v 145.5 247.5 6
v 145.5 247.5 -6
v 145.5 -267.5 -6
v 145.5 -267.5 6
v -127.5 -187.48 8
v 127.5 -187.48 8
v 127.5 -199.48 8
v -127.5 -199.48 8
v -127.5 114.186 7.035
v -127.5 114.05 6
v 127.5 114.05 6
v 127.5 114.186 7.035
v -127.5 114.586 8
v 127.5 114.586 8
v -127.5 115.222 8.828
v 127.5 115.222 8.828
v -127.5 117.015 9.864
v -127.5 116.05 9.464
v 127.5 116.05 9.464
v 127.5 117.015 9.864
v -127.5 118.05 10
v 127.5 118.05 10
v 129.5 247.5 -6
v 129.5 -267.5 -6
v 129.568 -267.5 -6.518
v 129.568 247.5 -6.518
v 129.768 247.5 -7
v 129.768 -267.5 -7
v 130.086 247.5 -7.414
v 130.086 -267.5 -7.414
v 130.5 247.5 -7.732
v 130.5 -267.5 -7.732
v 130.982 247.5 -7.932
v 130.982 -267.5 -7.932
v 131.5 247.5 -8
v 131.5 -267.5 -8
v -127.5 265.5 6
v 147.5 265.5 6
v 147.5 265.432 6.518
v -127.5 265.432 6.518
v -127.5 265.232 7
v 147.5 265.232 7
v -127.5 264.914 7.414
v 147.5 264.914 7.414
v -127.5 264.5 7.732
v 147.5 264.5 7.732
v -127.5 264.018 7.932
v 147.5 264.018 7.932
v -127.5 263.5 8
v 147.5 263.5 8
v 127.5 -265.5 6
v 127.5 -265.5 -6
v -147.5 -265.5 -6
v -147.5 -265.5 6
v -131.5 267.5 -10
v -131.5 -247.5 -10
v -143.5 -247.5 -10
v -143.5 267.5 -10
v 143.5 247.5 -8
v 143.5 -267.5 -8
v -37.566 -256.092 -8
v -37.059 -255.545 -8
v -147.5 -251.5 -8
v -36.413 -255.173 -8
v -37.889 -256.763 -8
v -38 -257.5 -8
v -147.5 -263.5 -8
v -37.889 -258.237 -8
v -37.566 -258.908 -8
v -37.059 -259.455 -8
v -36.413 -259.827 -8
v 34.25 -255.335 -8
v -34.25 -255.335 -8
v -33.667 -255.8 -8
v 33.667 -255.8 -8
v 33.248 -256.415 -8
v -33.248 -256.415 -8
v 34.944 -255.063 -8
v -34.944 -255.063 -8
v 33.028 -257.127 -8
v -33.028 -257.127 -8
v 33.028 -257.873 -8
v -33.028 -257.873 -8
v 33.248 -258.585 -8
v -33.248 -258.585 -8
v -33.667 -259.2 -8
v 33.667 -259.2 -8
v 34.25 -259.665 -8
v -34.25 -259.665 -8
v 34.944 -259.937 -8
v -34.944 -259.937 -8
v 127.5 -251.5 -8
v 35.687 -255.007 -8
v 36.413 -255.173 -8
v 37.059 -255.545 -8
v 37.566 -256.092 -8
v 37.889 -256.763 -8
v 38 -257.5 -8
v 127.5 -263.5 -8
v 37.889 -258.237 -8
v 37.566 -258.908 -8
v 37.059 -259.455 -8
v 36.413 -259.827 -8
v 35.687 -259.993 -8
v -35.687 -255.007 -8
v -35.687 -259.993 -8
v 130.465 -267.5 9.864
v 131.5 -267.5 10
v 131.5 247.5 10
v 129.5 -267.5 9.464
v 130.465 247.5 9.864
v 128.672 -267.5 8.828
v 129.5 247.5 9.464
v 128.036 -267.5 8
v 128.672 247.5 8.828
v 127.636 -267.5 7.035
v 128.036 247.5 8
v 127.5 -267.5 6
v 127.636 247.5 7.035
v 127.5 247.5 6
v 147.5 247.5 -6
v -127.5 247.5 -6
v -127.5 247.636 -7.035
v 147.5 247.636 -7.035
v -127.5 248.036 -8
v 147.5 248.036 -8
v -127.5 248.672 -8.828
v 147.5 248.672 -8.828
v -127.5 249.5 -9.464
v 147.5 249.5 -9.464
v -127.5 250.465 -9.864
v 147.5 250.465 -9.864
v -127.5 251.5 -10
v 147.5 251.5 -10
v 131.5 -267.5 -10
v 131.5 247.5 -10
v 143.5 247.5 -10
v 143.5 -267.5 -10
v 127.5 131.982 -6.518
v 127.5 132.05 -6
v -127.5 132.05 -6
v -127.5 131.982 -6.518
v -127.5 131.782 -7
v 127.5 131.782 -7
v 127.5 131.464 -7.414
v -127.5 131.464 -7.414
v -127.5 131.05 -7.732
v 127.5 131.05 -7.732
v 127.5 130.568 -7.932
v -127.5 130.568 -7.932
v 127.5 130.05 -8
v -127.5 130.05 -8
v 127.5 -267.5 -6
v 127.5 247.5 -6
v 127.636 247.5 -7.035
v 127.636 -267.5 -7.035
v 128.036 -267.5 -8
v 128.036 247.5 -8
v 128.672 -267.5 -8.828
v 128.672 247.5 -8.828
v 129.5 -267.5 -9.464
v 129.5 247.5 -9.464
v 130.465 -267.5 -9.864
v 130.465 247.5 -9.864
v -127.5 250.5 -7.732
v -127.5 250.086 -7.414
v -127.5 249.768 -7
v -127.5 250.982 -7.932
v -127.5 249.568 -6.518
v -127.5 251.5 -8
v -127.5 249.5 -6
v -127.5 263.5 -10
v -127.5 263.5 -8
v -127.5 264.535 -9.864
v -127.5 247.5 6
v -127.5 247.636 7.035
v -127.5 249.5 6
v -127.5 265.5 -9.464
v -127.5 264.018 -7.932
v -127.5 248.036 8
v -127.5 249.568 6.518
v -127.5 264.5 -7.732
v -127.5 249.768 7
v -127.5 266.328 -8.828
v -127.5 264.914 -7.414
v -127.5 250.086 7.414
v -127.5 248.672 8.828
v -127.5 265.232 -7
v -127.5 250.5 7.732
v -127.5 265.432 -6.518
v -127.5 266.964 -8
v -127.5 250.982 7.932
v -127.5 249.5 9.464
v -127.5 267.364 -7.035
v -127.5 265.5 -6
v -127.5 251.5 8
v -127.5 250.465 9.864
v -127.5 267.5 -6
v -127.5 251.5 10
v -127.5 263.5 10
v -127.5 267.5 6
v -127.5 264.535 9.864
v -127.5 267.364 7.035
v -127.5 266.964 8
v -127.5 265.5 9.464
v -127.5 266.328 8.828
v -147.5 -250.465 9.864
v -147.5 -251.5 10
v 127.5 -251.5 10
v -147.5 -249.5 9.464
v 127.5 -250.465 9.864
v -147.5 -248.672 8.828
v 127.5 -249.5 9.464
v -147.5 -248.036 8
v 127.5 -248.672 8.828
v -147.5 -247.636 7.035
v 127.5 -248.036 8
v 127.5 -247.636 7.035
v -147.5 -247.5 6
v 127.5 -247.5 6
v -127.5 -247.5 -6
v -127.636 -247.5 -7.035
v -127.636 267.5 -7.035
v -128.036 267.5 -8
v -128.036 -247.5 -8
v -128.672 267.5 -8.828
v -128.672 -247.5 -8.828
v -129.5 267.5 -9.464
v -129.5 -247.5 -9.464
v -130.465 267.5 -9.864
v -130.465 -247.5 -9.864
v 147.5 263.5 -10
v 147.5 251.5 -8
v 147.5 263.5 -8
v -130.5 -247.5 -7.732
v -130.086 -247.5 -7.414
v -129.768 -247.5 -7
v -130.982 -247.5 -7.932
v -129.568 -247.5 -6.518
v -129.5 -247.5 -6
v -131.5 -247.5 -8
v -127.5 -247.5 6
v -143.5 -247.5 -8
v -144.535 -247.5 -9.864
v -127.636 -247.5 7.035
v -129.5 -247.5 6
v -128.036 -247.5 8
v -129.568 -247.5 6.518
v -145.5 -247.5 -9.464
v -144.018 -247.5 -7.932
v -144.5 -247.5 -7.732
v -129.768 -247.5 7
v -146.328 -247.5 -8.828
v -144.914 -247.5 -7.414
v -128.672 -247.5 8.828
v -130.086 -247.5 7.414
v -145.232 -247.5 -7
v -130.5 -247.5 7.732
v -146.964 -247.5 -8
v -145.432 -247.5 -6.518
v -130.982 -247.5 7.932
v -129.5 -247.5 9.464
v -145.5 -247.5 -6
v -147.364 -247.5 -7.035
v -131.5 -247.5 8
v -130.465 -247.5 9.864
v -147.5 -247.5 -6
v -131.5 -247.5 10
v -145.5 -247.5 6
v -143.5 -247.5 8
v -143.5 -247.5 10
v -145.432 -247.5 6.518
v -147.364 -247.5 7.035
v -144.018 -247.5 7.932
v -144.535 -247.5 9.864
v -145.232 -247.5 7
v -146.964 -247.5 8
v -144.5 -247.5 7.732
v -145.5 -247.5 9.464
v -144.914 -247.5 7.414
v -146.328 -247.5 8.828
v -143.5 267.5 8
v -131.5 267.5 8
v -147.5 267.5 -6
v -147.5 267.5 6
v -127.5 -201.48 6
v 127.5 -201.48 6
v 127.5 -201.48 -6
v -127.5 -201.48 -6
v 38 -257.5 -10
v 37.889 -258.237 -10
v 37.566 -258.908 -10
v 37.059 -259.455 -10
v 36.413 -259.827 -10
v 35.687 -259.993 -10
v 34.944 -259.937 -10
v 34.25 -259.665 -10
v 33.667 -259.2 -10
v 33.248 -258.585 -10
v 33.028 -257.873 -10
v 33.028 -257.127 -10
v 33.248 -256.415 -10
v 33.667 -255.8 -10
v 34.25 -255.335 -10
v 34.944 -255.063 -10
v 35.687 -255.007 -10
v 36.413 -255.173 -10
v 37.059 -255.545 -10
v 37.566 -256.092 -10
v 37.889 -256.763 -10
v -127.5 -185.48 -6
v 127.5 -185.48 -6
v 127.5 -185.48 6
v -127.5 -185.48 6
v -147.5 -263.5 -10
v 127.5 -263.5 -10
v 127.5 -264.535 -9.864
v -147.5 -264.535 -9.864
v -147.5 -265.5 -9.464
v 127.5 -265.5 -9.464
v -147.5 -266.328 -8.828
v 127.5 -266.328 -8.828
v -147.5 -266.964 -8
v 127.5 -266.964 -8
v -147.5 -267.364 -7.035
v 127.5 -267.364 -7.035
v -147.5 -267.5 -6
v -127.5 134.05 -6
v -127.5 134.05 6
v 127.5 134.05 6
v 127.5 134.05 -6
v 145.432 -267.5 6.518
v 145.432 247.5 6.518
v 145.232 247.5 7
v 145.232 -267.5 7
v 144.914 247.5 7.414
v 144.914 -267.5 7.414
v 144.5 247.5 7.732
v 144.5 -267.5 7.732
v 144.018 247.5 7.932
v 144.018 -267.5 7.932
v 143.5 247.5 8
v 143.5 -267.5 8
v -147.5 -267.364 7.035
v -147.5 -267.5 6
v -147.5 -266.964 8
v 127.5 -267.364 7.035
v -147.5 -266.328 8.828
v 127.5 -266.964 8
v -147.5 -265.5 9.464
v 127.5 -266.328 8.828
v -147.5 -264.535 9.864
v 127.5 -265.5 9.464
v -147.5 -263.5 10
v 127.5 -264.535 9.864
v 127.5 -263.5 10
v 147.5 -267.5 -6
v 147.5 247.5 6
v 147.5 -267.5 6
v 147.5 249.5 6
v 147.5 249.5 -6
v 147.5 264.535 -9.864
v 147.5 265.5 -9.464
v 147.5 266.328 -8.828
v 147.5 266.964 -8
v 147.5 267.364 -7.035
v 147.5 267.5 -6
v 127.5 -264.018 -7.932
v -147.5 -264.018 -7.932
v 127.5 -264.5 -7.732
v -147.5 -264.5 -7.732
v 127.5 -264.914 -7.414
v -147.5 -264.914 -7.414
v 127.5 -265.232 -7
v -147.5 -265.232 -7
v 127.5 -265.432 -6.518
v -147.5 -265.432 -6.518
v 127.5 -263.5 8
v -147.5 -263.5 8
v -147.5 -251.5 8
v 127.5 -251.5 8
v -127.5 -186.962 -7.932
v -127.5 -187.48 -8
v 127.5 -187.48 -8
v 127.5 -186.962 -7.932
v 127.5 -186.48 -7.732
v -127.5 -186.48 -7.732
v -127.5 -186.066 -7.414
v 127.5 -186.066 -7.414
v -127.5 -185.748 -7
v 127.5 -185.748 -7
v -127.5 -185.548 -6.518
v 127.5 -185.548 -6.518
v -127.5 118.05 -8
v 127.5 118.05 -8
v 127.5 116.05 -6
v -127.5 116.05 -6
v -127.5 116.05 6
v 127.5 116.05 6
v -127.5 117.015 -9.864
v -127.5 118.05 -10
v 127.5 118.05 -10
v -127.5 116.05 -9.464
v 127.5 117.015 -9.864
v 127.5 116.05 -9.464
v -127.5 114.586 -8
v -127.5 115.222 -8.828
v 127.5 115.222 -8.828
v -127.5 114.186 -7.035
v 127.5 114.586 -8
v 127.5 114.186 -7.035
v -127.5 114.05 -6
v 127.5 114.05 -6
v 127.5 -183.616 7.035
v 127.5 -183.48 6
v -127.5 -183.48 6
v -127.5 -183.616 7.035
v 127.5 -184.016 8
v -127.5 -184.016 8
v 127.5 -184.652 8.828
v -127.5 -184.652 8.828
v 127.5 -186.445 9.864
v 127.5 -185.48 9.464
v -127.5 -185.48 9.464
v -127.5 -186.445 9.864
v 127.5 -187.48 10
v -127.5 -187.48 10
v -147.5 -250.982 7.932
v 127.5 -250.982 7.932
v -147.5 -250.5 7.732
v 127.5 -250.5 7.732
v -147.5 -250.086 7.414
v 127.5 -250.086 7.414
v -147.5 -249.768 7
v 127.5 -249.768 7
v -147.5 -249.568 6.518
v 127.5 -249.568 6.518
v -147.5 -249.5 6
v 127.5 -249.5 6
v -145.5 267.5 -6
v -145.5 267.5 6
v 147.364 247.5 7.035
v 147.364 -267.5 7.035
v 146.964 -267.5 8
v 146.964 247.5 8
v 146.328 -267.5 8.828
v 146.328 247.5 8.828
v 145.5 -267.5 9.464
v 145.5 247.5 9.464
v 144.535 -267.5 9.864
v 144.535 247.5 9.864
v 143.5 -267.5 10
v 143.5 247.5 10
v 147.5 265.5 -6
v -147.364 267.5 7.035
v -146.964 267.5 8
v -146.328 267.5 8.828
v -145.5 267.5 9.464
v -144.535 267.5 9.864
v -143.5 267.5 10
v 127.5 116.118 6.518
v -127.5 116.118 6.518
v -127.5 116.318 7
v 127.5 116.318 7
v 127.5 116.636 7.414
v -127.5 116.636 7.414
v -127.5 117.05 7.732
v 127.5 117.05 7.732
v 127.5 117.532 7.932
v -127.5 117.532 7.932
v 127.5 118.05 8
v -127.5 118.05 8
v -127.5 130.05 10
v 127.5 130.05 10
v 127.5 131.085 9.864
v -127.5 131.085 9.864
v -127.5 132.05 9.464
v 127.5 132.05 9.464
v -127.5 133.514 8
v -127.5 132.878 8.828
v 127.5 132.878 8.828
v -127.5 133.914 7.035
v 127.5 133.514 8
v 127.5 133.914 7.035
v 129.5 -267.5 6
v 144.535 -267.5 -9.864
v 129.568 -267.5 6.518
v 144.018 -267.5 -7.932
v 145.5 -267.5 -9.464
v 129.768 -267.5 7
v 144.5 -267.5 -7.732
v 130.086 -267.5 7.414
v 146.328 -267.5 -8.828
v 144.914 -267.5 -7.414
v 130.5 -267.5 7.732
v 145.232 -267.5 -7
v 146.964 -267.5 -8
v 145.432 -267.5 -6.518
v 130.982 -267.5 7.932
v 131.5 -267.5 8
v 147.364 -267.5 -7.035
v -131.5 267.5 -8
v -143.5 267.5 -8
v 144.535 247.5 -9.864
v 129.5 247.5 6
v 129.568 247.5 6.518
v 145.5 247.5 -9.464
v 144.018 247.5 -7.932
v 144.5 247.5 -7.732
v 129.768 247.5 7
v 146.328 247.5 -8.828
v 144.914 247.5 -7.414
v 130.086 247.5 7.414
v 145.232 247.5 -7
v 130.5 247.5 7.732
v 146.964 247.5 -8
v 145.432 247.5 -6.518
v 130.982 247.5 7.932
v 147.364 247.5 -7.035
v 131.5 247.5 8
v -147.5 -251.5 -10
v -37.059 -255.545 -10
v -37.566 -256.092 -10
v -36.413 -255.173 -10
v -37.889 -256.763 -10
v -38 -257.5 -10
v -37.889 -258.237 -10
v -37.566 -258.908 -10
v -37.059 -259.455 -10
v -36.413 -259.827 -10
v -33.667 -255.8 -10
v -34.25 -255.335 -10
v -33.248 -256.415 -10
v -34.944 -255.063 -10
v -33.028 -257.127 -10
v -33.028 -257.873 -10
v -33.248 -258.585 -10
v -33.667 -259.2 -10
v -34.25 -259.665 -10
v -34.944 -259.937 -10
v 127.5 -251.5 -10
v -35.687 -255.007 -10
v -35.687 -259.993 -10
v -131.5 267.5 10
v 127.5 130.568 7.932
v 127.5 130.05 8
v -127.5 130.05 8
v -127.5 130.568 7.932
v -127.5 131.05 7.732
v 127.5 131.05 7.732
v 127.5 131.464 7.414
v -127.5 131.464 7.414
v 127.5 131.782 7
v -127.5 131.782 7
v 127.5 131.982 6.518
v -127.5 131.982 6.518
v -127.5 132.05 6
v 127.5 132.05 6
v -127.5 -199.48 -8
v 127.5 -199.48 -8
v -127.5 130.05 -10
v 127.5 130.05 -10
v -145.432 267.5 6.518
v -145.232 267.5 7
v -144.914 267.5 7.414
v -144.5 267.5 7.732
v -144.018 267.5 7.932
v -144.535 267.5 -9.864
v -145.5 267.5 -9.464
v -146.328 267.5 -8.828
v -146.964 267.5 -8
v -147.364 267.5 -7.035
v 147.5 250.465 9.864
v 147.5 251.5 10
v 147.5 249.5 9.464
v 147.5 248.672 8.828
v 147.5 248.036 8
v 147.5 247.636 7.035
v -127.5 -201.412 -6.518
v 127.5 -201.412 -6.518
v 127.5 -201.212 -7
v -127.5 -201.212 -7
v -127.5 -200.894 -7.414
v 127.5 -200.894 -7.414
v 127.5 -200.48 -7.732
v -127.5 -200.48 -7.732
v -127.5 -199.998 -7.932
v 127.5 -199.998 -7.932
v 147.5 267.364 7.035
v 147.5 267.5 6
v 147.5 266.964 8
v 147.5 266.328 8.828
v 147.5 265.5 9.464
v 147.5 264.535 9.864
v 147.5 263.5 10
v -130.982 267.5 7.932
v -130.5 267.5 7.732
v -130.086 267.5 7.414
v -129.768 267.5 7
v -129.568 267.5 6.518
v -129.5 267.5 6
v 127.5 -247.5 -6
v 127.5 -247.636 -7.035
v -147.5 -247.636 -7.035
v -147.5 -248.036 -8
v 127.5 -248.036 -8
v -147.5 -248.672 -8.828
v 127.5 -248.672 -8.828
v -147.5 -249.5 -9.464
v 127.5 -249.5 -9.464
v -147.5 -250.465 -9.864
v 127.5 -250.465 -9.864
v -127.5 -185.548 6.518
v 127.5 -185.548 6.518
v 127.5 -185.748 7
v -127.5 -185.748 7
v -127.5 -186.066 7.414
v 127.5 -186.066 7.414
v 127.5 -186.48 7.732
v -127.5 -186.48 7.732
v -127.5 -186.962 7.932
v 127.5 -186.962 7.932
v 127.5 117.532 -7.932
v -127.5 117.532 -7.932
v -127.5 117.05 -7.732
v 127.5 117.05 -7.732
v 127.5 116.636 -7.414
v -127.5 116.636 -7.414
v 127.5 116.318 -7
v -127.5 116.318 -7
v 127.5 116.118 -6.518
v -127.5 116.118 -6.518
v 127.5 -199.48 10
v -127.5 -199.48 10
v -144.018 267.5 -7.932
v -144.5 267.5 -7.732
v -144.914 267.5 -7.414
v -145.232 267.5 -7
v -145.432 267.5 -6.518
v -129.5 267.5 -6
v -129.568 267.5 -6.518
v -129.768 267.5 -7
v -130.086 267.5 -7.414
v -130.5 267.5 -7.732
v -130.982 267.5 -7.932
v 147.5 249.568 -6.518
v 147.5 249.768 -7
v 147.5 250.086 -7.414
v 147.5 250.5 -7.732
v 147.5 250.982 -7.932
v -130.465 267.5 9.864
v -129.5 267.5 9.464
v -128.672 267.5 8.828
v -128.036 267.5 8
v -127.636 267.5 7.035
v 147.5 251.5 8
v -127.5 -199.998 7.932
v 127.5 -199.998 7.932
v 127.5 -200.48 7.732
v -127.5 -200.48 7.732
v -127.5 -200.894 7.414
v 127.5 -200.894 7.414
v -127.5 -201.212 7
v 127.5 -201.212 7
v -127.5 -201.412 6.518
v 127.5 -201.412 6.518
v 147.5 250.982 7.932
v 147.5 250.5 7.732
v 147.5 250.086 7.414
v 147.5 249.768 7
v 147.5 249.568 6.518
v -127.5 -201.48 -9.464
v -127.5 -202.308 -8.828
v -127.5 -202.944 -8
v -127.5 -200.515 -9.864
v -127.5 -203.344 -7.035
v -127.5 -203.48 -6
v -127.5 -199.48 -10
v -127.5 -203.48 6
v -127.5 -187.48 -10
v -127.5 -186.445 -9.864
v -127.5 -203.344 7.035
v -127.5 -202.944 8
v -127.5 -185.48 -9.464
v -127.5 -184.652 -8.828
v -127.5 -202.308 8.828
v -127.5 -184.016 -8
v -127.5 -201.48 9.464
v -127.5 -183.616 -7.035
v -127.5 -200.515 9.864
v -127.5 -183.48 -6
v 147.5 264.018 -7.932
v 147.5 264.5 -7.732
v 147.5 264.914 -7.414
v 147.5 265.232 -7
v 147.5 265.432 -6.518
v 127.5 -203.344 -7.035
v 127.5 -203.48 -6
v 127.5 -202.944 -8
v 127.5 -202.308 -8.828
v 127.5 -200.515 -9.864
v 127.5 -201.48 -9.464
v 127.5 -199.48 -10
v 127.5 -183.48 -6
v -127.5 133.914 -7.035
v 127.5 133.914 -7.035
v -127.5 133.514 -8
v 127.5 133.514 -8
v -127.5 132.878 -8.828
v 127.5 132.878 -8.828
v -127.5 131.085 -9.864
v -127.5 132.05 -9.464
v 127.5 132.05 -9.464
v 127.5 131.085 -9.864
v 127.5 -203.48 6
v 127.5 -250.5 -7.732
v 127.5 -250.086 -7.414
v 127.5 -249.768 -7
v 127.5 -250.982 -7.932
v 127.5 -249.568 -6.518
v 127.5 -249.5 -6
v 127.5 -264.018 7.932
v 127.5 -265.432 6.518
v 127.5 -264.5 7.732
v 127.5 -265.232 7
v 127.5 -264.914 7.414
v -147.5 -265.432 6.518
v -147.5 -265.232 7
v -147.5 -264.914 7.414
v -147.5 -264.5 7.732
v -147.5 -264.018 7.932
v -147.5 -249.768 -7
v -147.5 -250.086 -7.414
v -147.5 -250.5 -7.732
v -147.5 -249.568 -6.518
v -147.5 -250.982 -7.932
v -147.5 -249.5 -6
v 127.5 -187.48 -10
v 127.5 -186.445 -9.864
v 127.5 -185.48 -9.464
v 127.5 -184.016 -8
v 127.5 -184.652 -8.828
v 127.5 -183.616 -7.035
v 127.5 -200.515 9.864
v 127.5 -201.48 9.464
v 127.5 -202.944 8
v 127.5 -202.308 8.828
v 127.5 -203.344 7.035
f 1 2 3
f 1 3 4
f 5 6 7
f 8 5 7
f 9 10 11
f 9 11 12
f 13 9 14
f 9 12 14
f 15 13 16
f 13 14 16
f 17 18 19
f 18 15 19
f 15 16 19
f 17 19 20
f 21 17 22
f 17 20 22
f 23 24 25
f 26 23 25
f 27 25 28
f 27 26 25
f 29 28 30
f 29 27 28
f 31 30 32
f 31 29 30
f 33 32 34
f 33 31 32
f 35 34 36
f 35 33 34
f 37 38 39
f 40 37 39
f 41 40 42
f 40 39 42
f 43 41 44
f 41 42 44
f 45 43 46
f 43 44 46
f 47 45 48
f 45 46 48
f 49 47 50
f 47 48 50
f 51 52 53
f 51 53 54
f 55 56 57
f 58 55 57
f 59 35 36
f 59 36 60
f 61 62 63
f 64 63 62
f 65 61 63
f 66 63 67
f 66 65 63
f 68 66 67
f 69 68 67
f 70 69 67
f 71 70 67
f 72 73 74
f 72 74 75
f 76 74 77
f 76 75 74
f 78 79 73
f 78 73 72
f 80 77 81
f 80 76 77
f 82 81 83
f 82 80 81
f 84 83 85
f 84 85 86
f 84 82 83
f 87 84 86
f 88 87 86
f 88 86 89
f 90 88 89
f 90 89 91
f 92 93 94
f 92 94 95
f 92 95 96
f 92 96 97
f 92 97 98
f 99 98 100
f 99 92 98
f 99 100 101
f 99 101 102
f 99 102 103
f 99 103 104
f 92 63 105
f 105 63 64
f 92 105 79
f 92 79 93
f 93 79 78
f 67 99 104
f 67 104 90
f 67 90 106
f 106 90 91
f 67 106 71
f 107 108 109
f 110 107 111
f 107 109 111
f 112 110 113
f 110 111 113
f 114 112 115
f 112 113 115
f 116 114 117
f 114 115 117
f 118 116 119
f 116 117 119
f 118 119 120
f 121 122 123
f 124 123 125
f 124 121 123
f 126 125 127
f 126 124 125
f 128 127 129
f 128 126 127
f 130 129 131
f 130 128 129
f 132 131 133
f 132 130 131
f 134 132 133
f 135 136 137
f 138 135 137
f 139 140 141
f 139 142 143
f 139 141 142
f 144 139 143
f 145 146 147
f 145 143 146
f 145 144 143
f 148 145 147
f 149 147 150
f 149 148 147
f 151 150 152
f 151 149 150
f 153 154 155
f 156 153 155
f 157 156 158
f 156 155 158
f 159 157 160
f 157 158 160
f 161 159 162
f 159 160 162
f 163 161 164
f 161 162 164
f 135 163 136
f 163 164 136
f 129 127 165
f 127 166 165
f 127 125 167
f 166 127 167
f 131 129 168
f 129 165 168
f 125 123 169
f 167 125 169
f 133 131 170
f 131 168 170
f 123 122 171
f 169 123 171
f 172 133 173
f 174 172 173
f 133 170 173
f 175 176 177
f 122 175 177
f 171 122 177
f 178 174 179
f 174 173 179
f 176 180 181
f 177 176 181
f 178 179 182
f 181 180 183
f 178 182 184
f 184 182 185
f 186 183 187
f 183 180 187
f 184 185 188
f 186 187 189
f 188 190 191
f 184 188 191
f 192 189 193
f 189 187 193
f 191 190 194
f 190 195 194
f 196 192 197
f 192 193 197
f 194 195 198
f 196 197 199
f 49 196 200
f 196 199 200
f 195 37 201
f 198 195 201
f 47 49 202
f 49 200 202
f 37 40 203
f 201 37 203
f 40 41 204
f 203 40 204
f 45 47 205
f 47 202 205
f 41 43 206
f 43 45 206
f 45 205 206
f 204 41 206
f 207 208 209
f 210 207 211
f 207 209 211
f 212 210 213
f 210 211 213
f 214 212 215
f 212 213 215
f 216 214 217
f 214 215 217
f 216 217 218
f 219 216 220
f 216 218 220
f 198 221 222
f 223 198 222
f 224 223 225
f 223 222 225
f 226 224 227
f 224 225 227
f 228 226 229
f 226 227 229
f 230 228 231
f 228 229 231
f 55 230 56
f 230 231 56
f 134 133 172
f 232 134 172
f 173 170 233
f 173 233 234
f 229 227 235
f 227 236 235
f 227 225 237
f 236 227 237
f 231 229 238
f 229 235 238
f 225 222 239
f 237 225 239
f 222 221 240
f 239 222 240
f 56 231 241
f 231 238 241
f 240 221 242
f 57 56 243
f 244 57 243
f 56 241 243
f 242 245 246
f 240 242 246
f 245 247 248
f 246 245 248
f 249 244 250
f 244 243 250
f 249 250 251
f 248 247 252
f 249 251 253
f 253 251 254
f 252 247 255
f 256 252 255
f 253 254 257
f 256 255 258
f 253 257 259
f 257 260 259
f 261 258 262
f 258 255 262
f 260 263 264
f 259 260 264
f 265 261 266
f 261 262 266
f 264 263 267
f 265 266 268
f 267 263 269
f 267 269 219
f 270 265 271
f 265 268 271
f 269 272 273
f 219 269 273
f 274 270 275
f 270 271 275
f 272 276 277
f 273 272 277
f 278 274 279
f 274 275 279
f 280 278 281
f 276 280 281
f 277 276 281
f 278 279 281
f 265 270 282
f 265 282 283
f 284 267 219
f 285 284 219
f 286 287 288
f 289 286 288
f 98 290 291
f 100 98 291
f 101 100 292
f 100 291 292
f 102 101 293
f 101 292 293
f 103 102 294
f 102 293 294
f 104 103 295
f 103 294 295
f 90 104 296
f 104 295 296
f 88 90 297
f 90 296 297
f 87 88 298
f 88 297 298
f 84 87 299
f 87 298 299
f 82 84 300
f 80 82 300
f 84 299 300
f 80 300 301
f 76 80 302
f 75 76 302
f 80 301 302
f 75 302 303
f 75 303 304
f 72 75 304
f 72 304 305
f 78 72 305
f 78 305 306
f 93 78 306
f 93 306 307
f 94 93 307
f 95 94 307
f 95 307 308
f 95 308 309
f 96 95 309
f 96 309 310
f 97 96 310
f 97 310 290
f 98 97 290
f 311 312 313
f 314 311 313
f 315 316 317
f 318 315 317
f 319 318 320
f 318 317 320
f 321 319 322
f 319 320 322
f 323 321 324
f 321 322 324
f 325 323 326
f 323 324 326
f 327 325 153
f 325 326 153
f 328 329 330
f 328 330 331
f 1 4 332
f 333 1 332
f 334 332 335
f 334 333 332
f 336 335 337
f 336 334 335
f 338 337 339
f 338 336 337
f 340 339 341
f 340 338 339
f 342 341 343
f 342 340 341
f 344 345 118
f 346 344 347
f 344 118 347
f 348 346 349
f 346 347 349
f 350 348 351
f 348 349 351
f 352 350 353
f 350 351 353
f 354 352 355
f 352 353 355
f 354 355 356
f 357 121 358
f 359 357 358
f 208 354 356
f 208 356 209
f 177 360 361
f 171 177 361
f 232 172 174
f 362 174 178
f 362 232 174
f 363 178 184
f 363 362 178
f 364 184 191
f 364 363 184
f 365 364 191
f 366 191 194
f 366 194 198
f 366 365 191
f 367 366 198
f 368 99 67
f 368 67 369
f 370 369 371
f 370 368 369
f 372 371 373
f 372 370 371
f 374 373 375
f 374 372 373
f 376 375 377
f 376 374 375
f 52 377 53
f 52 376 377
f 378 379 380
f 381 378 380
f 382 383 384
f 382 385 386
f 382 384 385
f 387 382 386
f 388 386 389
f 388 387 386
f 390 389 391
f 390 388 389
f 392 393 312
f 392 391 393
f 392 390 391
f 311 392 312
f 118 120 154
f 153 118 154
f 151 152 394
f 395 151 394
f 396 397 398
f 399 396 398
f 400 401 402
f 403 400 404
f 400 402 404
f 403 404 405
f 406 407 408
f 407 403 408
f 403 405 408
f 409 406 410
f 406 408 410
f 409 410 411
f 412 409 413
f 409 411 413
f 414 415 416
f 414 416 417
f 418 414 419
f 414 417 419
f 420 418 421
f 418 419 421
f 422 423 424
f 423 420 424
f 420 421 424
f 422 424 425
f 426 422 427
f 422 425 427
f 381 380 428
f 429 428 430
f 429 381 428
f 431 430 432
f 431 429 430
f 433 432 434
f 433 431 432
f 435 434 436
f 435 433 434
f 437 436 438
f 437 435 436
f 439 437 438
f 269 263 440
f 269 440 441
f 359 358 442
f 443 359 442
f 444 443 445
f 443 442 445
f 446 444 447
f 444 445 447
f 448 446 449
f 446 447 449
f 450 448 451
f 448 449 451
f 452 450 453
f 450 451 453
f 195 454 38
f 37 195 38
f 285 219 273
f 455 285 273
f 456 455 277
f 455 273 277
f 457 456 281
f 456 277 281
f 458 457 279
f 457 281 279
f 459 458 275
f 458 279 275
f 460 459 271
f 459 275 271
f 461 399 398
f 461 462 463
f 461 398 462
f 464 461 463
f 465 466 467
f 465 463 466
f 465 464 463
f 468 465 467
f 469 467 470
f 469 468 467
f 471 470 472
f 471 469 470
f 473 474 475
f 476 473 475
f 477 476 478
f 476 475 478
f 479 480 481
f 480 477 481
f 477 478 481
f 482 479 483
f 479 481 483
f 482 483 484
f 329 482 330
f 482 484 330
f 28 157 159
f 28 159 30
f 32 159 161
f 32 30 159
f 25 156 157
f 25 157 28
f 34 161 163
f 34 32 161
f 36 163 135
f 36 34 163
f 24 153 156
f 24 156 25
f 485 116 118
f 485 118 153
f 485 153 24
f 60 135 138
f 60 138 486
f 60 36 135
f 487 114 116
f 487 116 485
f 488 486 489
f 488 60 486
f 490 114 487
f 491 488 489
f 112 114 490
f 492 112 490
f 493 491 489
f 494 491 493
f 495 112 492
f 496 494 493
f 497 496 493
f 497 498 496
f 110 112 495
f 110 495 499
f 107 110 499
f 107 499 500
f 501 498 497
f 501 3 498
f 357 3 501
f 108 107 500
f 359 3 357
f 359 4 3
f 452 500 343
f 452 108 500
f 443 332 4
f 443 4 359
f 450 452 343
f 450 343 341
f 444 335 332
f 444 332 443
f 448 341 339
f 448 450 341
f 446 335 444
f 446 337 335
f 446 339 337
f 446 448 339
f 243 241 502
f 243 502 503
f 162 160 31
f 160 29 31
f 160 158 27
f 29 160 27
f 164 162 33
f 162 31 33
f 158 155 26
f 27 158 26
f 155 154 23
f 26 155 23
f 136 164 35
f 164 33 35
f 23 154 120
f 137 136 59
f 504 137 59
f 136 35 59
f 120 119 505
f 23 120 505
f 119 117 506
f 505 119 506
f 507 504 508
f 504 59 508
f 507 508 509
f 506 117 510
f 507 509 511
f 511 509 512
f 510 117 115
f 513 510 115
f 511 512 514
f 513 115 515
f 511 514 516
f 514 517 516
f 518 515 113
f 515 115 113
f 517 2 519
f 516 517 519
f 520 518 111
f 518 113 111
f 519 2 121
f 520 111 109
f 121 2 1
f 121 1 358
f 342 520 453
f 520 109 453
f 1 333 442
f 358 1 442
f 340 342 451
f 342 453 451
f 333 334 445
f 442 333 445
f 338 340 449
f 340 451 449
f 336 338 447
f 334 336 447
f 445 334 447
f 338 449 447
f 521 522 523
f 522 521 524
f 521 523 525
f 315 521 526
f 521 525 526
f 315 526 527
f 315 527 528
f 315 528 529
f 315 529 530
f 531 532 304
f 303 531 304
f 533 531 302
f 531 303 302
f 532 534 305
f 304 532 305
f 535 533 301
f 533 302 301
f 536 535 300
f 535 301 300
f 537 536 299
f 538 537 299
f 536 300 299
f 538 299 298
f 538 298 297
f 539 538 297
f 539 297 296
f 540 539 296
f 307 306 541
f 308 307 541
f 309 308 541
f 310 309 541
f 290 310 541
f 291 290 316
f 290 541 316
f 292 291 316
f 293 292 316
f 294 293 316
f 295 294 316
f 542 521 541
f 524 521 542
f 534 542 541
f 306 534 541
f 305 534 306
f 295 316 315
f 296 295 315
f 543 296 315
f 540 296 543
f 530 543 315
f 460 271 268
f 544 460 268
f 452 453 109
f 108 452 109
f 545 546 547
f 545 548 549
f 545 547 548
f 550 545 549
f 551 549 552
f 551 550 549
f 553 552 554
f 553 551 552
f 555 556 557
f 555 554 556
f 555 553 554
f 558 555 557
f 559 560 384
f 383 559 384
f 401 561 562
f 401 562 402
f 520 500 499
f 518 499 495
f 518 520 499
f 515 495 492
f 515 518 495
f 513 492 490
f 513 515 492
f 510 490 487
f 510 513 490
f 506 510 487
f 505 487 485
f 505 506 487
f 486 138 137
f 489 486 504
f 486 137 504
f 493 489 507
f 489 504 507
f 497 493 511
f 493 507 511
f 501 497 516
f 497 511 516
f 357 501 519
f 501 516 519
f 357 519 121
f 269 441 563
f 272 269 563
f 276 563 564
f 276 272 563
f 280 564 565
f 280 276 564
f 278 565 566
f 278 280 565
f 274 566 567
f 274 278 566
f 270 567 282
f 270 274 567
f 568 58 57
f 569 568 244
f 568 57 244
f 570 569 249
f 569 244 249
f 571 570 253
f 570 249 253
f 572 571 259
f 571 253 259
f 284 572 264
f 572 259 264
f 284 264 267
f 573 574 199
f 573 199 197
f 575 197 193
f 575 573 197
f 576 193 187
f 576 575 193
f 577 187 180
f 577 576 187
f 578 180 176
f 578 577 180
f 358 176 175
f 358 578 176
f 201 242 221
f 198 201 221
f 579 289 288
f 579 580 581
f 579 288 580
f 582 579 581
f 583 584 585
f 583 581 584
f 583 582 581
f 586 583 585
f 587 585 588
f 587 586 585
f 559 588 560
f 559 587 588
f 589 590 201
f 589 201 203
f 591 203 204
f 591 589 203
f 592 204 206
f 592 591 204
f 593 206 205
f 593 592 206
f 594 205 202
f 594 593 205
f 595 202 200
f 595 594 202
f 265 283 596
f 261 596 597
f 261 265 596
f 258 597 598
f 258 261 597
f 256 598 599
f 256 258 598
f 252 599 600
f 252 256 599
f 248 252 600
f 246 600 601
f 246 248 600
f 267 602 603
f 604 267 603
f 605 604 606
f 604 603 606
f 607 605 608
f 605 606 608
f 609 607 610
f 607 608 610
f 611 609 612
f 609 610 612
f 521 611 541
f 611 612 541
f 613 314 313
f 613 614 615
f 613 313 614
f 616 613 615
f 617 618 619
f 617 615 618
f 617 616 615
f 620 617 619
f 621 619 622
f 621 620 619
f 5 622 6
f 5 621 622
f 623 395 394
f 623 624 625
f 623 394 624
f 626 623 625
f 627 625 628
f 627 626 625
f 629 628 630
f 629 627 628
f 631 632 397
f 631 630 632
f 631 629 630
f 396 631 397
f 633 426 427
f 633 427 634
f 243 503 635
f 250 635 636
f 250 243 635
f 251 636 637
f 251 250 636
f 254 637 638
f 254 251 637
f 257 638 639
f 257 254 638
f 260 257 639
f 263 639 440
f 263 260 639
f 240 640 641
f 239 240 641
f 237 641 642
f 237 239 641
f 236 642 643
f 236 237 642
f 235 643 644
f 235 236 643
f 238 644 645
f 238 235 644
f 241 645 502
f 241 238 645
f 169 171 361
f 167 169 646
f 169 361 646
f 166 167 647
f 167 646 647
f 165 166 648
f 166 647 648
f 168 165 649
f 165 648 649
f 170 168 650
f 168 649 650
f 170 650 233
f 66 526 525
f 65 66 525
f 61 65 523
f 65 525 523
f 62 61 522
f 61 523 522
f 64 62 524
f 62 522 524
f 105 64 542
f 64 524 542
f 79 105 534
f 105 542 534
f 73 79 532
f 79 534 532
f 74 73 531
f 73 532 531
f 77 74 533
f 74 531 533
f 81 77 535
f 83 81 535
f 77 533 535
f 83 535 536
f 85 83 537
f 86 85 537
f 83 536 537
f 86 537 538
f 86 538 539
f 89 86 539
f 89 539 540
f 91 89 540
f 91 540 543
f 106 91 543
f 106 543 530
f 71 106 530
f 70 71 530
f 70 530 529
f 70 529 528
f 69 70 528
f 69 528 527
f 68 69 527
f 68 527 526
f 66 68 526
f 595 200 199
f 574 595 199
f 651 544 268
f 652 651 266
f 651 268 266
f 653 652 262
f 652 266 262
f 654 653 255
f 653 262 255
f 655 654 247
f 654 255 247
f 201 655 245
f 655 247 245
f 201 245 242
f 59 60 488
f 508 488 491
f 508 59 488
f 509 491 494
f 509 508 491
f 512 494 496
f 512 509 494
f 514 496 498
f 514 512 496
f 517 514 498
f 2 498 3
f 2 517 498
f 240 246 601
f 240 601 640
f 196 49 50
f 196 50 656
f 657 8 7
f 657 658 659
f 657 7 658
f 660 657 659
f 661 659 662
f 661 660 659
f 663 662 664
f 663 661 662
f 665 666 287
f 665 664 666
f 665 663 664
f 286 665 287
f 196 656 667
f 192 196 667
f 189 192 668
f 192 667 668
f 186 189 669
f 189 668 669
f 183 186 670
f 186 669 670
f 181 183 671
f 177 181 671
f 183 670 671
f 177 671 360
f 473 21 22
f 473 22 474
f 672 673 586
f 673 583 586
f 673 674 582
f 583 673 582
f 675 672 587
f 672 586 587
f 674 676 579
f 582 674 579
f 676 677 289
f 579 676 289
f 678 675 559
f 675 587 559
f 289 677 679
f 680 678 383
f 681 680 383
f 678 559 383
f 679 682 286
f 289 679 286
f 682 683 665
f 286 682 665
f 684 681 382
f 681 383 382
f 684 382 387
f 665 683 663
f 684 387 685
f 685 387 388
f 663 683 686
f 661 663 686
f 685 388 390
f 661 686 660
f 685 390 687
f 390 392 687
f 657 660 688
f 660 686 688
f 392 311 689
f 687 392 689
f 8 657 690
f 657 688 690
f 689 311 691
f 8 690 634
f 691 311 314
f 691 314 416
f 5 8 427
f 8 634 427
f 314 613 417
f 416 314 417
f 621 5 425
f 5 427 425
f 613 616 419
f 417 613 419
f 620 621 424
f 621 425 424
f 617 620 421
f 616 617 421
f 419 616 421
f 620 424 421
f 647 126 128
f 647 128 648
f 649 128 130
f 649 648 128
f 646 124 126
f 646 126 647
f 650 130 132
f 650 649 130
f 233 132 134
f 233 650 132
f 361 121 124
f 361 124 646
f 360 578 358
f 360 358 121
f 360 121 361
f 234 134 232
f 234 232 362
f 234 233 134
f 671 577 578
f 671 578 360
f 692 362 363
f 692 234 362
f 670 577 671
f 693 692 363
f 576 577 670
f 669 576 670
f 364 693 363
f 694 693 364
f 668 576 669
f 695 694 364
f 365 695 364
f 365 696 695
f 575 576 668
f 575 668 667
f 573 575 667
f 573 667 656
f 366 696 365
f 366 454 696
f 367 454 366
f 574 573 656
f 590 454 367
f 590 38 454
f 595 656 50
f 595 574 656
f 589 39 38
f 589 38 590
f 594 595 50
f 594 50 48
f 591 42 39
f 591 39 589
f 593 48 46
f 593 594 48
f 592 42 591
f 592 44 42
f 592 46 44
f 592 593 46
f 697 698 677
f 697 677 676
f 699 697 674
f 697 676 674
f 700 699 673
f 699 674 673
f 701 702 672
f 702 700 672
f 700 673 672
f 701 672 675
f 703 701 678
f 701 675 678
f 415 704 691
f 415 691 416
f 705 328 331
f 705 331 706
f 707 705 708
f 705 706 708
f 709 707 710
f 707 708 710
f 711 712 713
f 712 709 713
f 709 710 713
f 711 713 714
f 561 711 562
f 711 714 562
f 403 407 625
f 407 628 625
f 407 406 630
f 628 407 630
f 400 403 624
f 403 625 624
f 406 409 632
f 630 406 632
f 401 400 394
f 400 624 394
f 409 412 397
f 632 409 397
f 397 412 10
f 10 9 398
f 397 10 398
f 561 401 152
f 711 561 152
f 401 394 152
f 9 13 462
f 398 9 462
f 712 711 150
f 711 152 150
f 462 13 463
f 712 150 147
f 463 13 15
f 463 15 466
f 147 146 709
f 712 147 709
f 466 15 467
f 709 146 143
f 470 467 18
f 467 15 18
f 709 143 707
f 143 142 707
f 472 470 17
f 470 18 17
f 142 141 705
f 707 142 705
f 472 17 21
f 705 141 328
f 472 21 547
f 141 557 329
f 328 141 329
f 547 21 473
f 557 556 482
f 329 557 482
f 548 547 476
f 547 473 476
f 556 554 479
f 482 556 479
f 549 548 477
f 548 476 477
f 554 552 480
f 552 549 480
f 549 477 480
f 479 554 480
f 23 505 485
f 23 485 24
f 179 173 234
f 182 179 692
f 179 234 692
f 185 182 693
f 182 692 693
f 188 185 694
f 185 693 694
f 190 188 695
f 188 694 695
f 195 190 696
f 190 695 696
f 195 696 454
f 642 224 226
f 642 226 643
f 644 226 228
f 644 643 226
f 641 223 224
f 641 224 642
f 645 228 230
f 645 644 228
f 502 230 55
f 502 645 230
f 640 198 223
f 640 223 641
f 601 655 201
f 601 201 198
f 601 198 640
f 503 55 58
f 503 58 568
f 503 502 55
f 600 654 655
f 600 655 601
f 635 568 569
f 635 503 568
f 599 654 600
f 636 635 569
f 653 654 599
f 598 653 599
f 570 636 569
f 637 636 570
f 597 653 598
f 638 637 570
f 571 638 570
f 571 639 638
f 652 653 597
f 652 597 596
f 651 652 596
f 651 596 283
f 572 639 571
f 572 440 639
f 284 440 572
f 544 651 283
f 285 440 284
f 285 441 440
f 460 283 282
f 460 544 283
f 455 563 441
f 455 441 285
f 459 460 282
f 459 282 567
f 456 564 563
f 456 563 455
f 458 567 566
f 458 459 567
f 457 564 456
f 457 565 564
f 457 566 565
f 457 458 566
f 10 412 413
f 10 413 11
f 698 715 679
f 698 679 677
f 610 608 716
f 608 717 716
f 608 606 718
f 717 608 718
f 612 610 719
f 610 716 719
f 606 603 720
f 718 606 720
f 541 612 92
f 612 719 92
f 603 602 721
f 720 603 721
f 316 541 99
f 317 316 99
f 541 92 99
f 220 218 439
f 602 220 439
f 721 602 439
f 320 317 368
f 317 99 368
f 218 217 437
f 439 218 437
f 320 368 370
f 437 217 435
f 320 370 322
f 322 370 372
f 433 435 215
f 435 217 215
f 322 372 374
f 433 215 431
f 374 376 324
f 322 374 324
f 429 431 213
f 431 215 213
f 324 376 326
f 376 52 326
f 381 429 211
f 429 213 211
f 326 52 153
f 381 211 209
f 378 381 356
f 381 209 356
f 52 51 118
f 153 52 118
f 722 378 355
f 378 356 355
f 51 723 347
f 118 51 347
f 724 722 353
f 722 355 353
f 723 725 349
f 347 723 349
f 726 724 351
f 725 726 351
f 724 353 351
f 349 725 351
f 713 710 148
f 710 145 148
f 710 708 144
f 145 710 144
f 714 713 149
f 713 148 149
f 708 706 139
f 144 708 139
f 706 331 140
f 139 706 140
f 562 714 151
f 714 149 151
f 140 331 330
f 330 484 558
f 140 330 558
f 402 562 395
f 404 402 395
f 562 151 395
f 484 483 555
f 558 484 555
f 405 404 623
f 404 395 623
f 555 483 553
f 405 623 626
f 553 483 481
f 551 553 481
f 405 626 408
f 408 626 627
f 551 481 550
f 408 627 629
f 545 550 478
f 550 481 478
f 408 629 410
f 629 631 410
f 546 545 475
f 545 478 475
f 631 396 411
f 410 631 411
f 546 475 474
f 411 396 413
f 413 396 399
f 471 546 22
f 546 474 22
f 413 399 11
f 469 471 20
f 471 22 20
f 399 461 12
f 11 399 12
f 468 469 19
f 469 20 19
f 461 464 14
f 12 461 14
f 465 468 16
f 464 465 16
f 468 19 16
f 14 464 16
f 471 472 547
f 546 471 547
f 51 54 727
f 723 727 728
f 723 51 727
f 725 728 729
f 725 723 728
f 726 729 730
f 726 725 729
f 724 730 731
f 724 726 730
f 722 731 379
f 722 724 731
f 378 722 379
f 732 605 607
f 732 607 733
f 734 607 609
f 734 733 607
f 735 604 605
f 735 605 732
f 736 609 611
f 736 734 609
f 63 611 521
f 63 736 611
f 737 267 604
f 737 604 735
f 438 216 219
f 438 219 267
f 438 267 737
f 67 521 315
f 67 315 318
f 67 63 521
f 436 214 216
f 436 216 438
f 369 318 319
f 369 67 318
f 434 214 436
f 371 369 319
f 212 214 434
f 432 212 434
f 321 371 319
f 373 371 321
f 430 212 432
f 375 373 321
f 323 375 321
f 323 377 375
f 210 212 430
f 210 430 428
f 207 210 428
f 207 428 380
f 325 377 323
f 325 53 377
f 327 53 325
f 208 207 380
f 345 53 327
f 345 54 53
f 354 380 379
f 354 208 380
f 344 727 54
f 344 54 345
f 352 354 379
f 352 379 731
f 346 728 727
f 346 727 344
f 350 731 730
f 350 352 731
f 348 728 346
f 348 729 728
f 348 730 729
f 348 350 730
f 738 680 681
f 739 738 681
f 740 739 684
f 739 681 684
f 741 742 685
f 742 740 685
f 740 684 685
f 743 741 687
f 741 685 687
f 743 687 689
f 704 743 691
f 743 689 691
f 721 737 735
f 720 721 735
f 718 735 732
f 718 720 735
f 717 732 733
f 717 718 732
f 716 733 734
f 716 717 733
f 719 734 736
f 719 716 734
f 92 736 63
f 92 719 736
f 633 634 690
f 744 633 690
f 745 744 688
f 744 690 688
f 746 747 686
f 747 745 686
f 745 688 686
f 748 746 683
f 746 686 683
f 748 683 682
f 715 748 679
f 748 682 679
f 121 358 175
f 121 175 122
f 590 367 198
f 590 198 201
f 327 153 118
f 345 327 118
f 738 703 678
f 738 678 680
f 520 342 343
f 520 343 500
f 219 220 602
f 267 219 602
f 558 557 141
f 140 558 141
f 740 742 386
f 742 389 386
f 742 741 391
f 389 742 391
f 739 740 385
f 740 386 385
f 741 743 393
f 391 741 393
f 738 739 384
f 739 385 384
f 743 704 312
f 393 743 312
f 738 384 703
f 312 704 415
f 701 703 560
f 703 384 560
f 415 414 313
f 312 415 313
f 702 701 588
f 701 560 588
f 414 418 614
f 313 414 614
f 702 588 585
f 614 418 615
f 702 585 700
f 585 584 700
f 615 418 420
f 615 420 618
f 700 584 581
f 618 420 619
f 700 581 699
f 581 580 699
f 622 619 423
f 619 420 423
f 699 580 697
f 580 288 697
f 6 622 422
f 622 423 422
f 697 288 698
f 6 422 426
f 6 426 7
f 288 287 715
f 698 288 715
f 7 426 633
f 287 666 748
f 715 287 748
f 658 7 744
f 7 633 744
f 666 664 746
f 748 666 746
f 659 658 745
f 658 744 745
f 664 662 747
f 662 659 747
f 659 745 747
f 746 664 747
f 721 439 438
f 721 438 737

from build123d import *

# Parameters (mm, degrees)
SQUARE_TUBE_20_X_20_X_2_1_DEPTH      = 285
SQUARE_TUBE_20_X_20_X_2_1_DEPTH_BACK = 1
SQUARE_TUBE_20_X_20_X_2_1_2_DEPTH    = 526
SQUARE_TUBE_20_X_20_X_2_1_3_DEPTH    = 286
SQUARE_TUBE_20_X_20_X_2_1_4_DEPTH    = 526
SQUARE_TUBE_20_X_20_X_2_1_5_DEPTH    = 277
SQUARE_TUBE_20_X_20_X_2_1_6_DEPTH    = 277
SKETCH17_R                           = 2.5
CUT_EXTRUDE1_DEPTH                   = 5


with BuildPart() as part:
    # Sketch16 → Square tube 20 X 20 X 2(1) (new, two sides)
    with BuildSketch(Plane(origin=(-137.5, 257.5, 0), x_dir=(0, 1, 0), z_dir=(1, 0, 0))) as square_tube_20_x_20_x_2_1_sk:
        with BuildLine():
            Line((-6, -10), (6, -10))
            ThreePointArc((6, -10), (8.828427125, -8.828427125), (10, -6))
            Line((10, -6), (10, 6))
            ThreePointArc((10, 6), (8.828427125, 8.828427125), (6, 10))
            Line((6, 10), (-6, 10))
            ThreePointArc((-6, 10), (-8.828427125, 8.828427125), (-10, 6))
            Line((-10, 6), (-10, -6))
            ThreePointArc((-10, -6), (-8.828427125, -8.828427125), (-6, -10))
        make_face()
        with BuildLine():
            Line((-6, -8), (6, -8))
            ThreePointArc((6, -8), (7.414213562, -7.414213562), (8, -6))
            Line((8, -6), (8, 6))
            ThreePointArc((8, 6), (7.414213562, 7.414213562), (6, 8))
            Line((6, 8), (-6, 8))
            ThreePointArc((-6, 8), (-7.414213562, 7.414213562), (-8, 6))
            Line((-8, 6), (-8, -6))
            ThreePointArc((-8, -6), (-7.414213562, -7.414213562), (-6, -8))
        make_face(mode=Mode.SUBTRACT)
    extrude(amount=SQUARE_TUBE_20_X_20_X_2_1_DEPTH)
    extrude(square_tube_20_x_20_x_2_1_sk.sketch, amount=-SQUARE_TUBE_20_X_20_X_2_1_DEPTH_BACK)

    # Square tube 20 X 20 X 2(1) end butt 1
    split(bisect_by=Plane(origin=(-127.5, 257.5, 0), x_dir=(0, 1, 0), z_dir=(1, 0, 0)), keep=Keep.TOP)


with BuildPart() as body_2:
    # Sketch16 on segment 2 (carried to segment 2) → Square tube 20 X 20 X 2_1 2 (new body)
    with BuildSketch(Plane(origin=(137.5, 258.5, 0), x_dir=(1, 0, 0), z_dir=(0, -1, 0))):
        with BuildLine():
            Line((-6, -10), (6, -10))
            ThreePointArc((6, -10), (8.828427125, -8.828427125), (10, -6))
            Line((10, -6), (10, 6))
            ThreePointArc((10, 6), (8.828427125, 8.828427125), (6, 10))
            Line((6, 10), (-6, 10))
            ThreePointArc((-6, 10), (-8.828427125, 8.828427125), (-10, 6))
            Line((-10, 6), (-10, -6))
            ThreePointArc((-10, -6), (-8.828427125, -8.828427125), (-6, -10))
        make_face()
        with BuildLine():
            Line((-6, -8), (6, -8))
            ThreePointArc((6, -8), (7.414213562, -7.414213562), (8, -6))
            Line((8, -6), (8, 6))
            ThreePointArc((8, 6), (7.414213562, 7.414213562), (6, 8))
            Line((6, 8), (-6, 8))
            ThreePointArc((-6, 8), (-7.414213562, 7.414213562), (-8, 6))
            Line((-8, 6), (-8, -6))
            ThreePointArc((-8, -6), (-7.414213562, -7.414213562), (-6, -8))
        make_face(mode=Mode.SUBTRACT)
    extrude(amount=SQUARE_TUBE_20_X_20_X_2_1_2_DEPTH)

    # Square tube 20 X 20 X 2_1 2 end butt 1
    split(bisect_by=Plane(origin=(137.5, 247.5, 0), x_dir=(1, 0, 0), z_dir=(0, -1, 0)), keep=Keep.TOP)


with BuildPart() as body_3:
    # Sketch16 on segment 3 (carried to segment 3) → Square tube 20 X 20 X 2_1 3 (new body)
    with BuildSketch(Plane(origin=(138.5, -257.5, 0), x_dir=(0, -1, 0), z_dir=(-1, 0, 0))):
        with BuildLine():
            Line((-6, -10), (6, -10))
            ThreePointArc((6, -10), (8.828427125, -8.828427125), (10, -6))
            Line((10, -6), (10, 6))
            ThreePointArc((10, 6), (8.828427125, 8.828427125), (6, 10))
            Line((6, 10), (-6, 10))
            ThreePointArc((-6, 10), (-8.828427125, 8.828427125), (-10, 6))
            Line((-10, 6), (-10, -6))
            ThreePointArc((-10, -6), (-8.828427125, -8.828427125), (-6, -10))
        make_face()
        with BuildLine():
            Line((-6, -8), (6, -8))
            ThreePointArc((6, -8), (7.414213562, -7.414213562), (8, -6))
            Line((8, -6), (8, 6))
            ThreePointArc((8, 6), (7.414213562, 7.414213562), (6, 8))
            Line((6, 8), (-6, 8))
            ThreePointArc((-6, 8), (-7.414213562, 7.414213562), (-8, 6))
            Line((-8, 6), (-8, -6))
            ThreePointArc((-8, -6), (-7.414213562, -7.414213562), (-6, -8))
        make_face(mode=Mode.SUBTRACT)
    extrude(amount=SQUARE_TUBE_20_X_20_X_2_1_3_DEPTH)

    # Square tube 20 X 20 X 2_1 3 end butt 1
    split(bisect_by=Plane(origin=(127.5, -257.5, 0), x_dir=(0, -1, 0), z_dir=(-1, 0, 0)), keep=Keep.TOP)

    # Sketch17 → Cut-Extrude1 (cut)
    with BuildSketch(Plane(origin=(0, 0, -10), x_dir=(-1, 0, 0), z_dir=(0, 0, -1))):
        with Locations((35.5, -257.5)):
            Circle(SKETCH17_R)
        with Locations(Location((-35.5, -257.5, 0), (0, 0, 180))):
            Circle(SKETCH17_R)
    extrude(amount=-CUT_EXTRUDE1_DEPTH, mode=Mode.SUBTRACT)


with BuildPart() as body_4:
    # Sketch16 on segment 4 (carried to segment 4) → Square tube 20 X 20 X 2_1 4 (new body)
    with BuildSketch(Plane(origin=(-137.5, -258.5, 0), x_dir=(-1, 0, 0), z_dir=(0, 1, 0))):
        with BuildLine():
            Line((-6, -10), (6, -10))
            ThreePointArc((6, -10), (8.828427125, -8.828427125), (10, -6))
            Line((10, -6), (10, 6))
            ThreePointArc((10, 6), (8.828427125, 8.828427125), (6, 10))
            Line((6, 10), (-6, 10))
            ThreePointArc((-6, 10), (-8.828427125, 8.828427125), (-10, 6))
            Line((-10, 6), (-10, -6))
            ThreePointArc((-10, -6), (-8.828427125, -8.828427125), (-6, -10))
        make_face()
        with BuildLine():
            Line((-6, -8), (6, -8))
            ThreePointArc((6, -8), (7.414213562, -7.414213562), (8, -6))
            Line((8, -6), (8, 6))
            ThreePointArc((8, 6), (7.414213562, 7.414213562), (6, 8))
            Line((6, 8), (-6, 8))
            ThreePointArc((-6, 8), (-7.414213562, 7.414213562), (-8, 6))
            Line((-8, 6), (-8, -6))
            ThreePointArc((-8, -6), (-7.414213562, -7.414213562), (-6, -8))
        make_face(mode=Mode.SUBTRACT)
    extrude(amount=SQUARE_TUBE_20_X_20_X_2_1_4_DEPTH)

    # Square tube 20 X 20 X 2_1 4 end butt 1
    split(bisect_by=Plane(origin=(-137.5, -247.5, 0), x_dir=(-1, 0, 0), z_dir=(0, 1, 0)), keep=Keep.TOP)


with BuildPart() as body_5:
    # Sketch16 on segment 5 (carried to segment 5) → Square tube 20 X 20 X 2_1 5 (new body)
    with BuildSketch(Plane(origin=(138.5, 124.05, 0), x_dir=(0, -1, 0), z_dir=(-1, 0, 0))):
        with BuildLine():
            Line((-6, -10), (6, -10))
            ThreePointArc((6, -10), (8.828427125, -8.828427125), (10, -6))
            Line((10, -6), (10, 6))
            ThreePointArc((10, 6), (8.828427125, 8.828427125), (6, 10))
            Line((6, 10), (-6, 10))
            ThreePointArc((-6, 10), (-8.828427125, 8.828427125), (-10, 6))
            Line((-10, 6), (-10, -6))
            ThreePointArc((-10, -6), (-8.828427125, -8.828427125), (-6, -10))
        make_face()
        with BuildLine():
            Line((-6, -8), (6, -8))
            ThreePointArc((6, -8), (7.414213562, -7.414213562), (8, -6))
            Line((8, -6), (8, 6))
            ThreePointArc((8, 6), (7.414213562, 7.414213562), (6, 8))
            Line((6, 8), (-6, 8))
            ThreePointArc((-6, 8), (-7.414213562, 7.414213562), (-8, 6))
            Line((-8, 6), (-8, -6))
            ThreePointArc((-8, -6), (-7.414213562, -7.414213562), (-6, -8))
        make_face(mode=Mode.SUBTRACT)
    extrude(amount=SQUARE_TUBE_20_X_20_X_2_1_5_DEPTH)

    # Square tube 20 X 20 X 2_1 5 end butt 1
    split(bisect_by=Plane(origin=(127.5, 124.05, 0), x_dir=(0, -1, 0), z_dir=(-1, 0, 0)), keep=Keep.TOP)

    # Square tube 20 X 20 X 2_1 5 end butt 2
    split(bisect_by=Plane(origin=(-127.5, 124.05, 0), x_dir=(0, 1, 0), z_dir=(1, 0, 0)), keep=Keep.TOP)


with BuildPart() as body_6:
    # Sketch16 on segment 6 (carried to segment 6) → Square tube 20 X 20 X 2_1 6 (new body)
    with BuildSketch(Plane(origin=(-138.5, -193.48, 0), x_dir=(0, 1, 0), z_dir=(1, 0, 0))):
        with BuildLine():
            Line((-6, -10), (6, -10))
            ThreePointArc((6, -10), (8.828427125, -8.828427125), (10, -6))
            Line((10, -6), (10, 6))
            ThreePointArc((10, 6), (8.828427125, 8.828427125), (6, 10))
            Line((6, 10), (-6, 10))
            ThreePointArc((-6, 10), (-8.828427125, 8.828427125), (-10, 6))
            Line((-10, 6), (-10, -6))
            ThreePointArc((-10, -6), (-8.828427125, -8.828427125), (-6, -10))
        make_face()
        with BuildLine():
            Line((-6, -8), (6, -8))
            ThreePointArc((6, -8), (7.414213562, -7.414213562), (8, -6))
            Line((8, -6), (8, 6))
            ThreePointArc((8, 6), (7.414213562, 7.414213562), (6, 8))
            Line((6, 8), (-6, 8))
            ThreePointArc((-6, 8), (-7.414213562, 7.414213562), (-8, 6))
            Line((-8, 6), (-8, -6))
            ThreePointArc((-8, -6), (-7.414213562, -7.414213562), (-6, -8))
        make_face(mode=Mode.SUBTRACT)
    extrude(amount=SQUARE_TUBE_20_X_20_X_2_1_6_DEPTH)

    # Square tube 20 X 20 X 2_1 6 end butt 1
    split(bisect_by=Plane(origin=(-127.5, -193.48, 0), x_dir=(0, 1, 0), z_dir=(1, 0, 0)), keep=Keep.TOP)

    # Square tube 20 X 20 X 2_1 6 end butt 2
    split(bisect_by=Plane(origin=(127.5, -193.48, 0), x_dir=(0, -1, 0), z_dir=(-1, 0, 0)), keep=Keep.TOP)


solid = Compound([part.part, body_2.part, body_3.part, body_4.part, body_5.part, body_6.part])
